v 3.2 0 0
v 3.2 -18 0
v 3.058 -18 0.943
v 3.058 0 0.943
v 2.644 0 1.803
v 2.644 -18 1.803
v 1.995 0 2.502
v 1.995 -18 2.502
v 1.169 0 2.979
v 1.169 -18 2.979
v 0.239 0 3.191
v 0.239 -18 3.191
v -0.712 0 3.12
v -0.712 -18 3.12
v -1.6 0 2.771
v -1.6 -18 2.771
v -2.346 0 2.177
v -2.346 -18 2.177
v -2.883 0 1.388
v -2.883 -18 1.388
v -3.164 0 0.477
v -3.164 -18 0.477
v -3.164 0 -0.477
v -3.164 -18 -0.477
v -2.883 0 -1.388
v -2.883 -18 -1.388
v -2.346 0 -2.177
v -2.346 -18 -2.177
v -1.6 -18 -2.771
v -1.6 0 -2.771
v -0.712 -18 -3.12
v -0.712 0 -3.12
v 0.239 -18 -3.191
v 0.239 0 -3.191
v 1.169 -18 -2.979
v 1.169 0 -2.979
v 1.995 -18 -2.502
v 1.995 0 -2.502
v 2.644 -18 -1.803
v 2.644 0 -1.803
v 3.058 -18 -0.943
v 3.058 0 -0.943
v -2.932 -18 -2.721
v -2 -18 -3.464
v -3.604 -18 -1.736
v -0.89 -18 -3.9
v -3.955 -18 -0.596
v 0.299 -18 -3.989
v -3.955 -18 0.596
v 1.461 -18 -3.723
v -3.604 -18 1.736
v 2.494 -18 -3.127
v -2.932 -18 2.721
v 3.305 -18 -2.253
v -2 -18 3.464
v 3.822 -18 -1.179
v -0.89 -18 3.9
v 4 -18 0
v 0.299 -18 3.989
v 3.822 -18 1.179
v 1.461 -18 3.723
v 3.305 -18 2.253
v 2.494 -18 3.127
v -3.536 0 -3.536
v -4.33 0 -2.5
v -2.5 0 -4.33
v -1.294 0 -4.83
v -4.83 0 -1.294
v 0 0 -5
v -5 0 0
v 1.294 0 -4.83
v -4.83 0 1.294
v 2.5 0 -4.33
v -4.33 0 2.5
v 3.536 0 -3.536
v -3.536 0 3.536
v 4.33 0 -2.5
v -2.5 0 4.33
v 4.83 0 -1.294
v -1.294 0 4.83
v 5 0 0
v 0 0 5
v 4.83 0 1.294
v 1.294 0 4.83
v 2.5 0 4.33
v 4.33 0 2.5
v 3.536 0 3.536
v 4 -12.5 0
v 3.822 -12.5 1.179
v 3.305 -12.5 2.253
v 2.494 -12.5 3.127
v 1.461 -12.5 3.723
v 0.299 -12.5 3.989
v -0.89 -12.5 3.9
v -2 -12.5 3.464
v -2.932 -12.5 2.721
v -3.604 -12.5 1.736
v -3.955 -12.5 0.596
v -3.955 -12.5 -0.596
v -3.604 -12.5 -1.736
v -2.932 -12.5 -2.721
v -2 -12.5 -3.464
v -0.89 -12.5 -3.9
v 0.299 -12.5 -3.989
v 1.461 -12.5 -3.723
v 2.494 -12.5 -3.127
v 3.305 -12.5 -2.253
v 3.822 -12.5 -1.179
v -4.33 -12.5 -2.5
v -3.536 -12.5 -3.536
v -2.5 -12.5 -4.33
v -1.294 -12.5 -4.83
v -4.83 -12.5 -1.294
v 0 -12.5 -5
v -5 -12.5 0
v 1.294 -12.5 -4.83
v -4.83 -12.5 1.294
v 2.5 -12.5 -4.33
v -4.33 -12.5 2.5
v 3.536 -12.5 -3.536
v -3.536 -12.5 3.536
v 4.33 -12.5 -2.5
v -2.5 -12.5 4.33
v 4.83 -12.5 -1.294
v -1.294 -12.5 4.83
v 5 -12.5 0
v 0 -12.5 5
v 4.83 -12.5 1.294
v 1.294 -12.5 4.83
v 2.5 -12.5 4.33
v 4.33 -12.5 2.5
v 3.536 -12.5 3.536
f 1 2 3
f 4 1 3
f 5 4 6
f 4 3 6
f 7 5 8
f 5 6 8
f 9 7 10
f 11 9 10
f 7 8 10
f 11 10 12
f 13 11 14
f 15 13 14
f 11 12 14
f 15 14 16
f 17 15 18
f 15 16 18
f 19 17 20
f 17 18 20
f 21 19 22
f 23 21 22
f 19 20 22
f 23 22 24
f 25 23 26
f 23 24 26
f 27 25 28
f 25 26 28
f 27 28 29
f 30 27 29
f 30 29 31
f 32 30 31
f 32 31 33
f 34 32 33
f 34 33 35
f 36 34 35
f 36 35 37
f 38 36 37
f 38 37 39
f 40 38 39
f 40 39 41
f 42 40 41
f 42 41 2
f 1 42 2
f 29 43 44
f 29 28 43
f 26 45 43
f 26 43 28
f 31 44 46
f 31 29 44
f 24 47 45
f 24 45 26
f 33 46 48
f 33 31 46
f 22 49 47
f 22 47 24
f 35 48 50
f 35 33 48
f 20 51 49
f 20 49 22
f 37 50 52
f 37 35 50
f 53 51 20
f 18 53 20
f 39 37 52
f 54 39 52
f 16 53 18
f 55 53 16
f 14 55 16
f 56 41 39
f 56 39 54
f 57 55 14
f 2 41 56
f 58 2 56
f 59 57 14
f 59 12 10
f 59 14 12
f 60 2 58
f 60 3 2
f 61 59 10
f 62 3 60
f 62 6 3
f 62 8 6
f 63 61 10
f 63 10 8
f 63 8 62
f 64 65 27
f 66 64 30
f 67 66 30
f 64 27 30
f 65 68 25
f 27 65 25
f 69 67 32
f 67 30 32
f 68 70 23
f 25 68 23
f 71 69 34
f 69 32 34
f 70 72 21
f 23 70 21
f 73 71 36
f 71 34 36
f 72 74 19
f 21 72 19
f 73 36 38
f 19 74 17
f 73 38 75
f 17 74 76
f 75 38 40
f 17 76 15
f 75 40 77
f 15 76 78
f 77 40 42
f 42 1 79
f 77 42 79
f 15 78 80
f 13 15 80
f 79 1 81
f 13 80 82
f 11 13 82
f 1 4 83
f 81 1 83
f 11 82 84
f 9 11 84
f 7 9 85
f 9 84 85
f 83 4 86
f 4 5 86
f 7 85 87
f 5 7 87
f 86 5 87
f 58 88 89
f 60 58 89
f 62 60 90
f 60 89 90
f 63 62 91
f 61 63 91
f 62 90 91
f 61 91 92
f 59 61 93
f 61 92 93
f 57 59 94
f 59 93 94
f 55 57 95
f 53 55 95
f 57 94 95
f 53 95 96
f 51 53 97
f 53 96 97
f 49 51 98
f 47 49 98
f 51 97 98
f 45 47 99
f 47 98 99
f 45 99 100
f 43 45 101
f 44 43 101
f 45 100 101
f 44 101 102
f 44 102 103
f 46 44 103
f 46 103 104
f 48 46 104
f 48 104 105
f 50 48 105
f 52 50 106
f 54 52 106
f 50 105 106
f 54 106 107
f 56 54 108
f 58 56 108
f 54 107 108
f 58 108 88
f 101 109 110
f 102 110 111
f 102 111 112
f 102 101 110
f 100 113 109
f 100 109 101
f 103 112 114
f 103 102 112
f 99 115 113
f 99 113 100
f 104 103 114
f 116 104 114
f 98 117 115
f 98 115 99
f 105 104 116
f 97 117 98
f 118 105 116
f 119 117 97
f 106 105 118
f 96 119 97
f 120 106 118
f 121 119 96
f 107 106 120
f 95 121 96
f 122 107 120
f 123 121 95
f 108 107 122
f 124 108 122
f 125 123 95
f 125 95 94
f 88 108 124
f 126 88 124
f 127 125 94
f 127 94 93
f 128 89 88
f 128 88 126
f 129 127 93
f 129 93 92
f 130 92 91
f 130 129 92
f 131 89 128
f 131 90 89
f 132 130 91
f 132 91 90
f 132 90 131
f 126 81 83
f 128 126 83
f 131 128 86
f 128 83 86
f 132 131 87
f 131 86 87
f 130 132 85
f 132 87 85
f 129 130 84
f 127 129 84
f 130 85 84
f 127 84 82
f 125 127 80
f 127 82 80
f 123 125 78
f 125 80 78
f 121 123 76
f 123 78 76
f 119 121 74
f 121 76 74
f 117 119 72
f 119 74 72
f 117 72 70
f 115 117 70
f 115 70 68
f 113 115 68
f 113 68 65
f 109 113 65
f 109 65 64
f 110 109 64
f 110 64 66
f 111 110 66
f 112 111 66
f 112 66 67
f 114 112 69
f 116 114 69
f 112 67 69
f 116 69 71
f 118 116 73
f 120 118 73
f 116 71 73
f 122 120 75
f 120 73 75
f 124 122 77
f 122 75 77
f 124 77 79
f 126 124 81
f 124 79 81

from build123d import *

# Parameters (mm, degrees)
F0_R     = 5
F1_DEPTH = 12.5
F2_R     = 4
F3_DEPTH = 5.5
F5_D     = 6.4


with BuildPart() as f1:
    # F0 (on Front) → F1 (new body)
    with BuildSketch(Plane.XZ):
        Circle(F0_R)
    extrude(amount=F1_DEPTH)

    # F2 (on face) → F3 (join)
    with BuildSketch(Plane.XZ.offset(12.5)):
        Circle(F2_R)
    extrude(amount=F3_DEPTH)

    # F5 (through all)
    with Locations(Plane(origin=(0, 0, 0), x_dir=(-1, 0, 0), z_dir=(0, 1, 0))):
        with Locations((0, 0)):
            Hole(F5_D / 2)


solid = f1.part
